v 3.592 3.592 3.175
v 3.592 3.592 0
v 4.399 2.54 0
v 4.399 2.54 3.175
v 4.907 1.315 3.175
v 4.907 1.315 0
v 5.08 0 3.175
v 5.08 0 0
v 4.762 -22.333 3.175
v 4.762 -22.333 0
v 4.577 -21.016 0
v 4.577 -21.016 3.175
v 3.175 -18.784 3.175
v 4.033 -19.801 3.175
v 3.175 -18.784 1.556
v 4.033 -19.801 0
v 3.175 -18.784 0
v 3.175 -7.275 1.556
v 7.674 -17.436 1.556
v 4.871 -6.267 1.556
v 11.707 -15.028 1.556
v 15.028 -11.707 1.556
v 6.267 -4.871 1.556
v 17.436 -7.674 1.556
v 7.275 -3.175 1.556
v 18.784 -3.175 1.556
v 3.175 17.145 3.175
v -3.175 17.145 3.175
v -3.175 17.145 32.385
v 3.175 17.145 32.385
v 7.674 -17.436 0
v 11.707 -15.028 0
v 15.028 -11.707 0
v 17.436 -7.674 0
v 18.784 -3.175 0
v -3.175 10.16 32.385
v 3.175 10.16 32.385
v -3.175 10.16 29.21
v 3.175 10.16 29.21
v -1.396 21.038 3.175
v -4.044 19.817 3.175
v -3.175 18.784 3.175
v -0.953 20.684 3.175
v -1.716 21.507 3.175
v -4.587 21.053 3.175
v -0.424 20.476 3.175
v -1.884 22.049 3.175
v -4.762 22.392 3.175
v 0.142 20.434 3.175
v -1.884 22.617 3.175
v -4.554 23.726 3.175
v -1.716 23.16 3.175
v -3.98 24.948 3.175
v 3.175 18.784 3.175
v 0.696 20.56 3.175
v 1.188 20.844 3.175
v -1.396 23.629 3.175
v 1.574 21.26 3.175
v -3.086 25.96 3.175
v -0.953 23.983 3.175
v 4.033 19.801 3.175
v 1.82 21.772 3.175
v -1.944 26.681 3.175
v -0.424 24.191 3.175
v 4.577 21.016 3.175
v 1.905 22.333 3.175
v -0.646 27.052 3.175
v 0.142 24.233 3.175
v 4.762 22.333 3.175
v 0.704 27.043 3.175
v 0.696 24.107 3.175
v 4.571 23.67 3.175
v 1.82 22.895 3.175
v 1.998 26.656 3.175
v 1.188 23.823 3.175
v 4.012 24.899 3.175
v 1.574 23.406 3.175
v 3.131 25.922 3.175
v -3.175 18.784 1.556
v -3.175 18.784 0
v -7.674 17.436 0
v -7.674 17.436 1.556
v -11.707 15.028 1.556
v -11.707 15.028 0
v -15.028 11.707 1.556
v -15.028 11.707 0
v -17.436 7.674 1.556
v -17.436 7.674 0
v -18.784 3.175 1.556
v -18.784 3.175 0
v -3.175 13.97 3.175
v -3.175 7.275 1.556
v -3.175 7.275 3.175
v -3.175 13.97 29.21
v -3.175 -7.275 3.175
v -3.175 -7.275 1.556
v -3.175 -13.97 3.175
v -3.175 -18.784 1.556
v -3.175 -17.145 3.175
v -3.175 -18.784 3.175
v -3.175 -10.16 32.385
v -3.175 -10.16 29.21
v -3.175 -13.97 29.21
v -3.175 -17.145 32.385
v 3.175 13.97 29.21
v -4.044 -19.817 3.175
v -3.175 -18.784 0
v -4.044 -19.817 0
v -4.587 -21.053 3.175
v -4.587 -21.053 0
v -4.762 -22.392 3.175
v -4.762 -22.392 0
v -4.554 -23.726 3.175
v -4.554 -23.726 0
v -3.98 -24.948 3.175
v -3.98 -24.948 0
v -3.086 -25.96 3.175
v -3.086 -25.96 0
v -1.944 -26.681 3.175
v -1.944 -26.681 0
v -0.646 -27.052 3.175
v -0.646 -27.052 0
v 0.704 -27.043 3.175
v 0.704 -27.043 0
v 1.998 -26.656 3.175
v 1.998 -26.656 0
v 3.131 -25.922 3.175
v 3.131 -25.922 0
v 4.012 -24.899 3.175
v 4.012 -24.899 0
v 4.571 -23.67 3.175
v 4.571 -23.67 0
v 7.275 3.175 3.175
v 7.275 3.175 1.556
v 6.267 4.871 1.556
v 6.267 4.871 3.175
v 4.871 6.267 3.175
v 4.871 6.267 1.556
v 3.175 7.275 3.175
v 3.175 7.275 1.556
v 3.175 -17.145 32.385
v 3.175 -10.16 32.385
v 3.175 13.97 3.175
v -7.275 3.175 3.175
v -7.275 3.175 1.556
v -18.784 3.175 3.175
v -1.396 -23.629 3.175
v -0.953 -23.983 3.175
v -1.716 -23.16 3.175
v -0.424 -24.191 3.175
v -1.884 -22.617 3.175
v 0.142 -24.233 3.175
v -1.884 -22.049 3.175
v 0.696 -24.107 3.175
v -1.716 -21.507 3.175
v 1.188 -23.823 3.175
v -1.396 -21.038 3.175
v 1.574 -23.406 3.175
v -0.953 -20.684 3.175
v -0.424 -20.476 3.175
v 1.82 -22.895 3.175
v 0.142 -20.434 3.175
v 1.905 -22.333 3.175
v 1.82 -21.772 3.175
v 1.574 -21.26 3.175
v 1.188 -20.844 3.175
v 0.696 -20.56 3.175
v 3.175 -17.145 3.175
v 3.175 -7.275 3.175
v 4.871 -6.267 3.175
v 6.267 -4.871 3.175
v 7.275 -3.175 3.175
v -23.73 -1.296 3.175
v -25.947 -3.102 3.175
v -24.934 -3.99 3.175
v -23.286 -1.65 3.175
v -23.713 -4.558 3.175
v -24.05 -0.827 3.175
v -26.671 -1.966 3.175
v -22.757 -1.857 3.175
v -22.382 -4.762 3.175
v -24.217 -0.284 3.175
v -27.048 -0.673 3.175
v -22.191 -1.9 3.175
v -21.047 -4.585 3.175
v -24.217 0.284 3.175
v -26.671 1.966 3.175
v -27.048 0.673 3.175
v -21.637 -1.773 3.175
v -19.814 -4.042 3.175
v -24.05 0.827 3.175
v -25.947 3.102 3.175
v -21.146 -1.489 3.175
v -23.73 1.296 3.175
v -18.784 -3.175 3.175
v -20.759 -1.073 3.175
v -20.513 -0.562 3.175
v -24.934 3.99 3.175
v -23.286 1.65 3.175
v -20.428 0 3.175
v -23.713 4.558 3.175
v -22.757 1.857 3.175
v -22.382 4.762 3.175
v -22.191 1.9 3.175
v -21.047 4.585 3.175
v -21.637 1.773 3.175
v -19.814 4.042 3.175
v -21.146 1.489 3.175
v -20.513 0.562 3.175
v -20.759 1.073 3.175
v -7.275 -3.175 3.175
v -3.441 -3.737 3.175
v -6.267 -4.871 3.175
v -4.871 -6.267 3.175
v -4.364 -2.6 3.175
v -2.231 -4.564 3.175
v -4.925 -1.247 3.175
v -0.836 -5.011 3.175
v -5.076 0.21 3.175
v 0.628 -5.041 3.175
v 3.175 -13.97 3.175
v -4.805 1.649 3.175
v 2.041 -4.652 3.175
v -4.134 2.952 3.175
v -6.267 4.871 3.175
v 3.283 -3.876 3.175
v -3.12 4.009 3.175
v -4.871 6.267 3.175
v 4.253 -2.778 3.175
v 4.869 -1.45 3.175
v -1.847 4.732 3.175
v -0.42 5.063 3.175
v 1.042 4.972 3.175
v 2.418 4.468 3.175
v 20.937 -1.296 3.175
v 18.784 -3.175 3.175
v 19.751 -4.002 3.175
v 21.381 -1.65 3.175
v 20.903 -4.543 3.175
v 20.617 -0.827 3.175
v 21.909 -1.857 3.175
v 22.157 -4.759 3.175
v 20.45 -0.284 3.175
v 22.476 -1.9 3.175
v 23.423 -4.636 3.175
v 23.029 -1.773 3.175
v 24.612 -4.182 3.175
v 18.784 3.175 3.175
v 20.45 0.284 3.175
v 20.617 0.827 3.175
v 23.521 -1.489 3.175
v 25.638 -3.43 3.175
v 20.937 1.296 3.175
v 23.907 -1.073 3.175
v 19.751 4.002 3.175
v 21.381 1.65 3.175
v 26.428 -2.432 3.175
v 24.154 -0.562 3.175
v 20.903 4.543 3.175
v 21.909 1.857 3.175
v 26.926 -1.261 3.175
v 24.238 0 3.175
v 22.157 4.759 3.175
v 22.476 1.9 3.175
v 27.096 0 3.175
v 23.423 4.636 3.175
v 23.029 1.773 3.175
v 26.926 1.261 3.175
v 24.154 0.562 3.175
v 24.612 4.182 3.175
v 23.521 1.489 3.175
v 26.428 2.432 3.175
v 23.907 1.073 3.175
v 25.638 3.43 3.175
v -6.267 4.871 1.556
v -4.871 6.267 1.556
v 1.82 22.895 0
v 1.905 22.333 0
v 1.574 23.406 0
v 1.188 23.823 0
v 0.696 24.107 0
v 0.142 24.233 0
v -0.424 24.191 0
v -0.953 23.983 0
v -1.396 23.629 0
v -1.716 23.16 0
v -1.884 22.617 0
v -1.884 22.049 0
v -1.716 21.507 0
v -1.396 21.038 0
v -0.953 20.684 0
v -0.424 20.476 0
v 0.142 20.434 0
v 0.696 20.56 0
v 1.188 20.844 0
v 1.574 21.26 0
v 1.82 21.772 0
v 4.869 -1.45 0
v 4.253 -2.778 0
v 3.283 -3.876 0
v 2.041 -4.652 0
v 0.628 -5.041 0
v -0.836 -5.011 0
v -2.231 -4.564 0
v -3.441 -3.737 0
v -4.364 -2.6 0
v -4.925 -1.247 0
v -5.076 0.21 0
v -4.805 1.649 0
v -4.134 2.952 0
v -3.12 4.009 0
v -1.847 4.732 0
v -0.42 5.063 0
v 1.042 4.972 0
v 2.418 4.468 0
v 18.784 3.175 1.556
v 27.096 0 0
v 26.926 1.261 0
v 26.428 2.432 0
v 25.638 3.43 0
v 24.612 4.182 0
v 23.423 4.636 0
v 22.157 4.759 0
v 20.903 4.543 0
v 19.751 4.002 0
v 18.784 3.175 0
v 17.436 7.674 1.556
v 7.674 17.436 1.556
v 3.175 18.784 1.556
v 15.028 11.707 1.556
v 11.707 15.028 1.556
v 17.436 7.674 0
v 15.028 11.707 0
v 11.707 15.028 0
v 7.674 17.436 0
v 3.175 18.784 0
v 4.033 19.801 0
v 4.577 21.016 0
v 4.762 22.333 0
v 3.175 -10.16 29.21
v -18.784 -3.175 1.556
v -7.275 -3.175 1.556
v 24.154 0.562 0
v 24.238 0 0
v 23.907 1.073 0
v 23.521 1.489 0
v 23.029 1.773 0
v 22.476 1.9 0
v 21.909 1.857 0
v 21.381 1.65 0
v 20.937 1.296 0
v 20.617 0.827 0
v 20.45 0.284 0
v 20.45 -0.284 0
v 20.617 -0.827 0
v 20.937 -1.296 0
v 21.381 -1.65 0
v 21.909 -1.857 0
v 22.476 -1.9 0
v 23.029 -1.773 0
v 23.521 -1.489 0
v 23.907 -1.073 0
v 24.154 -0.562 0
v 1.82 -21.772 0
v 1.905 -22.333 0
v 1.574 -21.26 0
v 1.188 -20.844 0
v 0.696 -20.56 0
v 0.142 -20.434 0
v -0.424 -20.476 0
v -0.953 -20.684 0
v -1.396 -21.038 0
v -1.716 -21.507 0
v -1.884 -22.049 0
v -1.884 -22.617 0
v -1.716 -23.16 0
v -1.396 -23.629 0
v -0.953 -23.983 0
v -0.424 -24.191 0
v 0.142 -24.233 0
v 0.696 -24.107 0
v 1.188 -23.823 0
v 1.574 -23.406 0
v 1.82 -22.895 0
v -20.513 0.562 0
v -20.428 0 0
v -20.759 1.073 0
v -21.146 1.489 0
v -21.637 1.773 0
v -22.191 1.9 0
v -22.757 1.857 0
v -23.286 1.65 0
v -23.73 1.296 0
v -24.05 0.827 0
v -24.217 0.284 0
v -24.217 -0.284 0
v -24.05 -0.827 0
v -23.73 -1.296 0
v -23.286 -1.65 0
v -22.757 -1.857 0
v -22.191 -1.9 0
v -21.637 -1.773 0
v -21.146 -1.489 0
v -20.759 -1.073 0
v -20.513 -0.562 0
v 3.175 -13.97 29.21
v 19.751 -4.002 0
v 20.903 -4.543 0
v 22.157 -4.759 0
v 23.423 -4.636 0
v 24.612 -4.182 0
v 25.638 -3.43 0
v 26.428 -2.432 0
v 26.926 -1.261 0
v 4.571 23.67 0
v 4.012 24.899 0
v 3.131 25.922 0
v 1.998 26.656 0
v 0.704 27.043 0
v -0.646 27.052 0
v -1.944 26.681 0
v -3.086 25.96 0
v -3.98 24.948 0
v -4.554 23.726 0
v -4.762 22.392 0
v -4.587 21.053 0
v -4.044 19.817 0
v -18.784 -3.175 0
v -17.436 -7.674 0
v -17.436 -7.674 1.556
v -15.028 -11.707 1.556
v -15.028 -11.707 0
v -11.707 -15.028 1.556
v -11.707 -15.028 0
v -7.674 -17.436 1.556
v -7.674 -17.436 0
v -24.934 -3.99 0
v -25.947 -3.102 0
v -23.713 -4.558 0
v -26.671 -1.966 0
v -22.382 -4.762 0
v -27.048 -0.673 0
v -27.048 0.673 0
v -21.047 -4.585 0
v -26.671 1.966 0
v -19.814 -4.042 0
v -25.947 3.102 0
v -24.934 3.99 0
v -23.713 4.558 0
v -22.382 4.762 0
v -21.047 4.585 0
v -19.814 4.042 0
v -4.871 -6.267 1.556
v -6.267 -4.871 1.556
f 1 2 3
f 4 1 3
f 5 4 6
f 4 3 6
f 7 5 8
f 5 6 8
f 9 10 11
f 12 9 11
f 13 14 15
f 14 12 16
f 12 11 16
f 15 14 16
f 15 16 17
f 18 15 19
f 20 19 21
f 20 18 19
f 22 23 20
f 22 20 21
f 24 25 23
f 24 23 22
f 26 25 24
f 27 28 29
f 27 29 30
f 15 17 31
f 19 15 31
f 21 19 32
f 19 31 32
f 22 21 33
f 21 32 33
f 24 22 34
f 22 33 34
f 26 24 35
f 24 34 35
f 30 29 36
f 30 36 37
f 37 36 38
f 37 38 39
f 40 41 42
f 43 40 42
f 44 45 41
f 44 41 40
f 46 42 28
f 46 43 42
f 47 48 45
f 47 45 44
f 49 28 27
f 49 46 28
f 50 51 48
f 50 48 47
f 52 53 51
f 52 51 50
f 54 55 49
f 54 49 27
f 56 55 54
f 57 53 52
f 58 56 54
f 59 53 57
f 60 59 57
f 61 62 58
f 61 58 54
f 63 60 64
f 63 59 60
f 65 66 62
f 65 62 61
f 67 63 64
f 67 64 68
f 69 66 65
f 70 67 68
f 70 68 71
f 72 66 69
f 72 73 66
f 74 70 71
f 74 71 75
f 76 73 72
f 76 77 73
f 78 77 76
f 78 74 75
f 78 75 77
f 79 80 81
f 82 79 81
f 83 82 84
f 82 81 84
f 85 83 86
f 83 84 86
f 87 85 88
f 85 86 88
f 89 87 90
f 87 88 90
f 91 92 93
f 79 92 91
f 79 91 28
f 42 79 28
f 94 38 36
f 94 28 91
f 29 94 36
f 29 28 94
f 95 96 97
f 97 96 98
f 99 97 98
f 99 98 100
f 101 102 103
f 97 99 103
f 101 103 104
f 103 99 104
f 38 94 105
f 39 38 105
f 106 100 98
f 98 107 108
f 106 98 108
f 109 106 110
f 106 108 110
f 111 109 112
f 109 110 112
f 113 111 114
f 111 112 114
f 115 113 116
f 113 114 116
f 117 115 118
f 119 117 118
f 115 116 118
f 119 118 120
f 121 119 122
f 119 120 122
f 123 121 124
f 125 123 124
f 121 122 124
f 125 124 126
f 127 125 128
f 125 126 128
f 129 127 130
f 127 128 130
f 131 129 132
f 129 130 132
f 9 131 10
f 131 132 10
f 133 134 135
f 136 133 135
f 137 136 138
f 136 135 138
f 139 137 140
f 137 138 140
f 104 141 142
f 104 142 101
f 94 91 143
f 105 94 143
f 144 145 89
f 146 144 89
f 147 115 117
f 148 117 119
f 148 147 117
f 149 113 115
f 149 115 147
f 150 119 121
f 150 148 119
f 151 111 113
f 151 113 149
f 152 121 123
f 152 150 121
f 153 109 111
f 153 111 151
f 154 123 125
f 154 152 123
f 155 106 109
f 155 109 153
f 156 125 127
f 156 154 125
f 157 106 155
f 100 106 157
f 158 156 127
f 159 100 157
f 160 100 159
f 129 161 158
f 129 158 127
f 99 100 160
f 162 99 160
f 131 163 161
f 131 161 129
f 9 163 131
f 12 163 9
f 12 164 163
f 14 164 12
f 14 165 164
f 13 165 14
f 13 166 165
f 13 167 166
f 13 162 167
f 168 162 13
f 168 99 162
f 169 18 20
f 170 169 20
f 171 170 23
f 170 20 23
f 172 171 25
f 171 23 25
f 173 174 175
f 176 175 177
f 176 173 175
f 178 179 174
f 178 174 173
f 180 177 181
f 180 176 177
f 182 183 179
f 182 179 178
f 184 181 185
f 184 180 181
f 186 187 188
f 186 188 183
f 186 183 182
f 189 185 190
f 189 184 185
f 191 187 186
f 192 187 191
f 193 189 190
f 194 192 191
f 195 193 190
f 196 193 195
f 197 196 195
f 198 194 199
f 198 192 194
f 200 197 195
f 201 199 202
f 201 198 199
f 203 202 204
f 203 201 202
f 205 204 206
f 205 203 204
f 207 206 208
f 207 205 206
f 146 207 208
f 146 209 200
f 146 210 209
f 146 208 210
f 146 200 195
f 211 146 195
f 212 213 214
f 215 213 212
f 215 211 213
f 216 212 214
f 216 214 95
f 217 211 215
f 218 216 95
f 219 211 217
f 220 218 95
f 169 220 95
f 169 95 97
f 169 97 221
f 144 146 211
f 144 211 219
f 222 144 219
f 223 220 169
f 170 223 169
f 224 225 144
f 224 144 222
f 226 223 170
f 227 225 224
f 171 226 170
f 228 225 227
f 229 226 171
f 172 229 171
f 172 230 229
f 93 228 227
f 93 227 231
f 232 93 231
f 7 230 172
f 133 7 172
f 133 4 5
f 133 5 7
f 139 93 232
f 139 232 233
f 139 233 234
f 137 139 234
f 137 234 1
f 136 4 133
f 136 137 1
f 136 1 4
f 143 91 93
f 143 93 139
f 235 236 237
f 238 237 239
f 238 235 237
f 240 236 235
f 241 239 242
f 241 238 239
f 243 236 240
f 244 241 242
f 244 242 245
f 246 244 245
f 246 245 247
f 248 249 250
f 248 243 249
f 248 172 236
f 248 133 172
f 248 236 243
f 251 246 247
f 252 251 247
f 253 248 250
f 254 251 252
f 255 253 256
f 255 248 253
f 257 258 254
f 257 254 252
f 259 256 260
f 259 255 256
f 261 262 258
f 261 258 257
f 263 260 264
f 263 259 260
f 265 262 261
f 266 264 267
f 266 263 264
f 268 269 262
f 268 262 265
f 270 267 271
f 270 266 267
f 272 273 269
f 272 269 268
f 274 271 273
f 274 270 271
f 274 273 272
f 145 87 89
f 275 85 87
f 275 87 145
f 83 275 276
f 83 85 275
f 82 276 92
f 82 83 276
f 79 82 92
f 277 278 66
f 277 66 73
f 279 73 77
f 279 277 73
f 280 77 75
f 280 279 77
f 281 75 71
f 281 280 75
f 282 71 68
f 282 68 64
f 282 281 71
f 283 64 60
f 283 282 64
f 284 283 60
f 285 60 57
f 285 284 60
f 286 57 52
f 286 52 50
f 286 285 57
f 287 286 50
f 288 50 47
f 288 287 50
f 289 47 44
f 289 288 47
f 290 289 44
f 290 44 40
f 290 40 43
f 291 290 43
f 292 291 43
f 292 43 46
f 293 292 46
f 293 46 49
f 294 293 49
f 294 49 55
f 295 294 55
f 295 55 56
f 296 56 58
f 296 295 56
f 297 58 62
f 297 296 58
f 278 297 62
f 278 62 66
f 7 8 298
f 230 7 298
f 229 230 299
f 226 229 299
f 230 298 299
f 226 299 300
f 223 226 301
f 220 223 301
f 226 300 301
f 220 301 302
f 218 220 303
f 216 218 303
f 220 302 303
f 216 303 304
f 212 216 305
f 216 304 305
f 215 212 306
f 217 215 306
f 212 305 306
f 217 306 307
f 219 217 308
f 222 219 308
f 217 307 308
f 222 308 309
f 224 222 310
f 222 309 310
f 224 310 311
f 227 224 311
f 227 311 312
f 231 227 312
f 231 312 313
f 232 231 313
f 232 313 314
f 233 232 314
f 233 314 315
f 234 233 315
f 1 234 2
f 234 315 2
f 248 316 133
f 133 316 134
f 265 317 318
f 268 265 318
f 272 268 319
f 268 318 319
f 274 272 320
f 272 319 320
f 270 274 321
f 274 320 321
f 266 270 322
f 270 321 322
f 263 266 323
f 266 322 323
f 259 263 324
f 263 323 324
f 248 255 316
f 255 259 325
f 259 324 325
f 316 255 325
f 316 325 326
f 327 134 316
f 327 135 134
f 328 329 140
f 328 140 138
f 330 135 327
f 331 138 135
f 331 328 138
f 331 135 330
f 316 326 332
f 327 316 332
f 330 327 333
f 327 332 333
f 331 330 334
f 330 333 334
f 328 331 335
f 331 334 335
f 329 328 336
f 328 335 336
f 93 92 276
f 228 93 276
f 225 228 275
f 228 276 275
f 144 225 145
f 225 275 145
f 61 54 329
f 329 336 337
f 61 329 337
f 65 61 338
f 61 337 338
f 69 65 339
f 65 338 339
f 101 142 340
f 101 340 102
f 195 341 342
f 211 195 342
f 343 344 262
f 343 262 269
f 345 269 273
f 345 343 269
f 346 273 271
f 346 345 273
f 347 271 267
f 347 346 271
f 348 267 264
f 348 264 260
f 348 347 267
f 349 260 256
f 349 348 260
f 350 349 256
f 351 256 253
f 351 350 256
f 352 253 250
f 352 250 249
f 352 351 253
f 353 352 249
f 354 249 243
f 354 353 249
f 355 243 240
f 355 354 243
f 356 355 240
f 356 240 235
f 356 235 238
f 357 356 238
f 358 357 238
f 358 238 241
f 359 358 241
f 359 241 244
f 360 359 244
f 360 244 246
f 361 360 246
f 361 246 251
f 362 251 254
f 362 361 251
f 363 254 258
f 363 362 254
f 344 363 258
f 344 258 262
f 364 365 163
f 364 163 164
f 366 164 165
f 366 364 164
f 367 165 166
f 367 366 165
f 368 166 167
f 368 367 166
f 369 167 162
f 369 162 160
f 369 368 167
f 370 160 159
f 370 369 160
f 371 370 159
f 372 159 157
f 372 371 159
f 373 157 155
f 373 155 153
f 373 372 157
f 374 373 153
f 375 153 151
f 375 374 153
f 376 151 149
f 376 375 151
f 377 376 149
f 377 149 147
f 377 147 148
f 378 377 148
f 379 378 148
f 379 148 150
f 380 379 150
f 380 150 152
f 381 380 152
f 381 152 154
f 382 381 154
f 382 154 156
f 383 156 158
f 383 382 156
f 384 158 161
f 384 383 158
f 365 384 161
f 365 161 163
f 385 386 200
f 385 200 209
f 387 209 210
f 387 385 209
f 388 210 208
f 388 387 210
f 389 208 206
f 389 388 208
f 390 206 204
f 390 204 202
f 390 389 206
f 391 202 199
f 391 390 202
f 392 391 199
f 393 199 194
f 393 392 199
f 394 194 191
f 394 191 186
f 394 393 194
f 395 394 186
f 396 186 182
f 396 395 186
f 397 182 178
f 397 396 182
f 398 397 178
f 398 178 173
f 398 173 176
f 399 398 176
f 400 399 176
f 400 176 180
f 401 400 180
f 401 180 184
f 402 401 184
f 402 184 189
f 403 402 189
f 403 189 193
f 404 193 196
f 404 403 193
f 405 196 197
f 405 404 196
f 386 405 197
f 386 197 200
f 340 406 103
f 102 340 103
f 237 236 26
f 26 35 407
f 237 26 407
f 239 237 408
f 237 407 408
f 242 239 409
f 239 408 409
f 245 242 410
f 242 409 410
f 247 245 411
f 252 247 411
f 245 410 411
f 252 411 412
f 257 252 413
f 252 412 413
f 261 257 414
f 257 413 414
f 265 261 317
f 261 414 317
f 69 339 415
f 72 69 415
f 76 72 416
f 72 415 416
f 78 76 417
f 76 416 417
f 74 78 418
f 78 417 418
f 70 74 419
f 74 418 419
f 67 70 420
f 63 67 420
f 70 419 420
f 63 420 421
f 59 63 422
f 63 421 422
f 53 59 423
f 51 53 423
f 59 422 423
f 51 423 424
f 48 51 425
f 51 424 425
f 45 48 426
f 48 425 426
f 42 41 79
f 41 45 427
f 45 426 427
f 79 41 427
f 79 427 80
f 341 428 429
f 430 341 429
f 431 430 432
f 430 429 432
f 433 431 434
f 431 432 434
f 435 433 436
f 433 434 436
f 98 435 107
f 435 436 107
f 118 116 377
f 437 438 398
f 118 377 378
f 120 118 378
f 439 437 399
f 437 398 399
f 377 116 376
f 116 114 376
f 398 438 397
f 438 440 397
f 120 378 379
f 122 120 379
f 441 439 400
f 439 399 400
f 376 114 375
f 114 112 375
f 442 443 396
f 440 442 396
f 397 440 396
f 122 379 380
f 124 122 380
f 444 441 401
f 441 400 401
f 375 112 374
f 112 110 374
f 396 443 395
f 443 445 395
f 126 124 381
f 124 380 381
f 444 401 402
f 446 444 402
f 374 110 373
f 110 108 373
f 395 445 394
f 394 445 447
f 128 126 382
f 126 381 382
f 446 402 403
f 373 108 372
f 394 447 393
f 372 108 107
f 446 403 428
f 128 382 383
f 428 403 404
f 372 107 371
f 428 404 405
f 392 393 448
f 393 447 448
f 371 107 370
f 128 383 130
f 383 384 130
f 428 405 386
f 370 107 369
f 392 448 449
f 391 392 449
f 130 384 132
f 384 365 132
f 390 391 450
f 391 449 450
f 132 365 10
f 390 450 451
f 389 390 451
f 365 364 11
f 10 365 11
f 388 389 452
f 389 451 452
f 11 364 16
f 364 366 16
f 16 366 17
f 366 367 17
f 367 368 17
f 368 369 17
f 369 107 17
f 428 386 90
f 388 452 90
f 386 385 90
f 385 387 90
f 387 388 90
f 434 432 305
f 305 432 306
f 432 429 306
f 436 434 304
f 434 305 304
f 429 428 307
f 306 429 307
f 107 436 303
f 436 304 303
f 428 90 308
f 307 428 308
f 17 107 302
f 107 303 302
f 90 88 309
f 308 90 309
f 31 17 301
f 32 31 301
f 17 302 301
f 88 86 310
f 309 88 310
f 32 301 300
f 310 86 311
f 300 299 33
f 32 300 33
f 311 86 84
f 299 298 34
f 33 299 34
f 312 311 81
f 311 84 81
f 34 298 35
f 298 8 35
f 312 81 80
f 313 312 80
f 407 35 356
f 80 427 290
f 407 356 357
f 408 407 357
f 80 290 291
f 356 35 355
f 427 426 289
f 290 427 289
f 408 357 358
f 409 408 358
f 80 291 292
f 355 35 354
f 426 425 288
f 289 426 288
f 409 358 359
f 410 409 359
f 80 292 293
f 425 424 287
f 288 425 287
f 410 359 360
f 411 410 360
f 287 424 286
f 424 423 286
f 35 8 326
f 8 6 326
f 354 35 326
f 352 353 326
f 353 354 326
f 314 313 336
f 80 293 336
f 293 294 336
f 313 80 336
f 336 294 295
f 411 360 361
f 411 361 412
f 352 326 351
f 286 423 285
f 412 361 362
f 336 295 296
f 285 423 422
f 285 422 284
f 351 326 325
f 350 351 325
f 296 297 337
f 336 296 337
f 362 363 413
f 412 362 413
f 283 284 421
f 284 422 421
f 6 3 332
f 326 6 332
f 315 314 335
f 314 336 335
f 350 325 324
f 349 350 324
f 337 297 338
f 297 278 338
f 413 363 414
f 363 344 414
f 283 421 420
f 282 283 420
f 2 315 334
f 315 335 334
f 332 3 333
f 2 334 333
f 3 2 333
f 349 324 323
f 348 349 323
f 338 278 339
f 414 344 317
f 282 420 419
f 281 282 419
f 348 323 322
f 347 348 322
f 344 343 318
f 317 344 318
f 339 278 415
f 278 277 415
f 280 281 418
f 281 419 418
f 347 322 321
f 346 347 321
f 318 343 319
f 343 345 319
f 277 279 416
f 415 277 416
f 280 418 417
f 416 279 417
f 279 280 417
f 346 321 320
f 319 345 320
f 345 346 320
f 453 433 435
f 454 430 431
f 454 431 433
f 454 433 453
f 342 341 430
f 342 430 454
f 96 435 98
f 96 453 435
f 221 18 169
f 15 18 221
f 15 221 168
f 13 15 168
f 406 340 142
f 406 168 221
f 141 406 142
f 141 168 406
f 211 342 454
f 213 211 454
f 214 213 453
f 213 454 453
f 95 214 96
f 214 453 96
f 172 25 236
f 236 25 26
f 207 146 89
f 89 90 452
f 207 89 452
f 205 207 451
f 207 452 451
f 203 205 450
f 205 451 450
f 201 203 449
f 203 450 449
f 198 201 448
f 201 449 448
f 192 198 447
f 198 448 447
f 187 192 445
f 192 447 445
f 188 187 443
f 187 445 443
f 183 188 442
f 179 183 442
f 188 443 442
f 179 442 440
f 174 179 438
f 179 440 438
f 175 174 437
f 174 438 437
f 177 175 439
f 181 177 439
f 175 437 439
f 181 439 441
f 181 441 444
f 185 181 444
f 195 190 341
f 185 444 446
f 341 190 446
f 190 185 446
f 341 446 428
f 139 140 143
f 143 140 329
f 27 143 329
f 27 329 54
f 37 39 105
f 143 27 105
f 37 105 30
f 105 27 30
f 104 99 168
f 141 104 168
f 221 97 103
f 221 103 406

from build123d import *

# Parameters (mm, degrees)
F0_R     = 1.905
F1_DEPTH = 3.175
F2_DEPTH = 1.55575
F0_W     = 6.35
F0_H     = 3.175
F3_DEPTH = 32.385
F5_W     = 6.35
F5_H     = 3.175
F6_DEPTH = 3.81
F4_W     = 6.35
F4_H     = 3.175
F7_DEPTH = 3.81


with BuildPart() as f1:
    # F0 (on Top) → F1 (new body)
    with BuildSketch(Plane.XY):
        with BuildLine():
            ThreePointArc((18.7835533113, -3.175), (17.5708112256, 0), (18.7835533113, 3.175))
            Line((18.7835533113, 3.175), (7.2748389157, 3.175))
            ThreePointArc((7.2748389157, 3.175), (7.7700688589, 1.6217077968), (7.9375, 0))
            ThreePointArc((7.9375, 0), (7.7700688589, -1.6217077968), (7.2748389157, -3.175))
            Line((7.2748389157, -3.175), (18.7835533113, -3.175))
        make_face()
        with BuildLine():
            ThreePointArc((18.7835533113, -3.175), (18.9832714591, -1.5930802583), (19.05, 0))
            ThreePointArc((19.05, 0), (18.9832714591, 1.5930802583), (18.7835533113, 3.175))
            ThreePointArc((18.7835533113, 3.175), (17.5708112256, 0), (18.7835533113, -3.175))
        make_face()
        with BuildLine():
            ThreePointArc((18.7835533113, 3.175), (18.9832714591, 1.5930802583), (19.05, 0))
            ThreePointArc((19.05, 0), (18.9832714591, -1.5930802583), (18.7835533113, -3.175))
            ThreePointArc((18.7835533113, -3.175), (24.0326764282, -4.4489958596), (27.0958112256, 0))
            ThreePointArc((27.0958112256, 0), (24.0326764282, 4.4489958596), (18.7835533113, 3.175))
        make_face()
        with Locations((22.3333112256, 0)):
            Circle(F0_R, mode=Mode.SUBTRACT)
        with BuildLine():
            ThreePointArc((-3.175, 7.2748389157), (0, 7.9375), (3.175, 7.2748389157))
            Line((3.175, 7.2748389157), (3.175, 13.97))
            Line((3.175, 13.97), (-3.175, 13.97))
            Line((-3.175, 13.97), (-3.175, 7.2748389157))
        make_face()
        with BuildLine():
            ThreePointArc((7.9375, 0), (7.7700688589, 1.6217077968), (7.2748389157, 3.175))
            ThreePointArc((7.2748389157, 3.175), (5.6126600757, 5.6126600757), (3.175, 7.2748389157))
            ThreePointArc((3.175, 7.2748389157), (0, 7.9375), (-3.175, 7.2748389157))
            ThreePointArc((-3.175, 7.2748389157), (-5.6126600757, 5.6126600757), (-7.2748389157, 3.175))
            ThreePointArc((-7.2748389157, 3.175), (-7.9375, 0), (-7.2748389157, -3.175))
            ThreePointArc((-7.2748389157, -3.175), (-5.6126600757, -5.6126600757), (-3.175, -7.2748389157))
            ThreePointArc((-3.175, -7.2748389157), (0, -7.9375), (3.175, -7.2748389157))
            ThreePointArc((3.175, -7.2748389157), (5.6126600757, -5.6126600757), (7.2748389157, -3.175))
            ThreePointArc((7.2748389157, -3.175), (7.7700688589, -1.6217077968), (7.9375, 0))
        make_face()
        with BuildLine():
            ThreePointArc((3.5921024484, 3.5921024484), (4.6933080252, 1.9440318364), (5.08, 0))
            ThreePointArc((5.08, 0), (-4.6933080252, -1.9440318364), (3.5921024484, 3.5921024484))
        make_face(mode=Mode.SUBTRACT)
        with BuildLine():
            Line((-7.2748389157, 3.175), (-18.7835533113, 3.175))
            ThreePointArc((-18.7835533113, 3.175), (-17.8843153661, 1.6993652025), (-17.5708112256, 0))
            ThreePointArc((-17.5708112256, 0), (-17.8843153661, -1.6993652025), (-18.7835533113, -3.175))
            Line((-18.7835533113, -3.175), (-7.2748389157, -3.175))
            ThreePointArc((-7.2748389157, -3.175), (-7.9375, 0), (-7.2748389157, 3.175))
        make_face()
        with BuildLine():
            Line((3.175, -13.97), (3.175, -7.2748389157))
            ThreePointArc((3.175, -7.2748389157), (0, -7.9375), (-3.175, -7.2748389157))
            Line((-3.175, -7.2748389157), (-3.175, -13.97))
            Line((-3.175, -13.97), (3.175, -13.97))
        make_face()
        with BuildLine():
            ThreePointArc((-17.5708112256, 0), (-17.8843153661, 1.6993652025), (-18.7835533113, 3.175))
            ThreePointArc((-18.7835533113, 3.175), (-19.05, 0), (-18.7835533113, -3.175))
            ThreePointArc((-18.7835533113, -3.175), (-17.8843153661, -1.6993652025), (-17.5708112256, 0))
        make_face()
        with BuildLine():
            ThreePointArc((-18.7835533113, -3.175), (-19.05, 0), (-18.7835533113, 3.175))
            ThreePointArc((-18.7835533113, 3.175), (-27.0958112256, 0), (-18.7835533113, -3.175))
        make_face()
        with Locations((-22.3333112256, 0)):
            Circle(F0_R, mode=Mode.SUBTRACT)
    extrude(amount=F1_DEPTH)



with BuildPart() as f1b:
    # F0 (on Top) → F1, piece 2 (new body)
    with BuildSketch(Plane.XY):
        with BuildLine():
            Line((3.175, 17.145), (3.175, 18.7835533113))
            ThreePointArc((3.175, 18.7835533113), (0, 17.5708112256), (-3.175, 18.7835533113))
            Line((-3.175, 18.7835533113), (-3.175, 17.145))
            Line((-3.175, 17.145), (3.175, 17.145))
        make_face()
        with BuildLine():
            ThreePointArc((-3.175, 18.7835533113), (0, 19.05), (3.175, 18.7835533113))
            ThreePointArc((3.175, 18.7835533113), (4.3475478002, 20.3890287423), (4.7625, 22.3333112256))
            ThreePointArc((4.7625, 22.3333112256), (-1.9442824833, 26.6808590258), (-3.175, 18.7835533113))
        make_face()
        with Locations((0, 22.3333112256)):
            Circle(F0_R, mode=Mode.SUBTRACT)
        with BuildLine():
            ThreePointArc((-3.175, 18.7835533113), (0, 17.5708112256), (3.175, 18.7835533113))
            ThreePointArc((3.175, 18.7835533113), (0, 19.05), (-3.175, 18.7835533113))
        make_face()
    extrude(amount=F1_DEPTH)


with BuildPart() as f1c:
    # F0 (on Top) → F1, piece 3 (new body)
    with BuildSketch(Plane.XY):
        with BuildLine():
            ThreePointArc((-3.175, -18.7835533113), (0, -17.5708112256), (3.175, -18.7835533113))
            Line((3.175, -18.7835533113), (3.175, -17.145))
            Line((3.175, -17.145), (-3.175, -17.145))
            Line((-3.175, -17.145), (-3.175, -18.7835533113))
        make_face()
        with BuildLine():
            ThreePointArc((-3.175, -18.7835533113), (0, -19.05), (3.175, -18.7835533113))
            ThreePointArc((3.175, -18.7835533113), (0, -17.5708112256), (-3.175, -18.7835533113))
        make_face()
        with BuildLine():
            ThreePointArc((4.7625, -22.3333112256), (4.3475478002, -20.3890287423), (3.175, -18.7835533113))
            ThreePointArc((3.175, -18.7835533113), (0, -19.05), (-3.175, -18.7835533113))
            ThreePointArc((-3.175, -18.7835533113), (-1.9442824833, -26.6808590258), (4.7625, -22.3333112256))
        make_face()
        with Locations((0, -22.3333112256)):
            Circle(F0_R, mode=Mode.SUBTRACT)
    extrude(amount=F1_DEPTH)


with BuildPart() as f1_1:
    add(f1.part)

    add(f1b.part)  # F2 merges F1b

    add(f1c.part)  # F2 merges F1c
    # F0 (on Top) → F2 (join)
    with BuildSketch(Plane.XY):
        with BuildLine():
            Line((7.2748389157, 3.175), (18.7835533113, 3.175))
            ThreePointArc((18.7835533113, 3.175), (13.4703841816, 13.4703841816), (3.175, 18.7835533113))
            Line((3.175, 18.7835533113), (3.175, 17.145))
            Line((3.175, 17.145), (3.175, 13.97))
            Line((3.175, 13.97), (3.175, 7.2748389157))
            ThreePointArc((3.175, 7.2748389157), (5.6126600757, 5.6126600757), (7.2748389157, 3.175))
        make_face()
        with BuildLine():
            ThreePointArc((3.175, -18.7835533113), (13.4703841816, -13.4703841816), (18.7835533113, -3.175))
            Line((18.7835533113, -3.175), (7.2748389157, -3.175))
            ThreePointArc((7.2748389157, -3.175), (5.6126600757, -5.6126600757), (3.175, -7.2748389157))
            Line((3.175, -7.2748389157), (3.175, -13.97))
            Line((3.175, -13.97), (3.175, -17.145))
            Line((3.175, -17.145), (3.175, -18.7835533113))
        make_face()
        with BuildLine():
            Line((-3.175, 17.145), (-3.175, 18.7835533113))
            ThreePointArc((-3.175, 18.7835533113), (-13.4703841816, 13.4703841816), (-18.7835533113, 3.175))
            Line((-18.7835533113, 3.175), (-7.2748389157, 3.175))
            ThreePointArc((-7.2748389157, 3.175), (-5.6126600757, 5.6126600757), (-3.175, 7.2748389157))
            Line((-3.175, 7.2748389157), (-3.175, 13.97))
            Line((-3.175, 13.97), (-3.175, 17.145))
        make_face()
        with BuildLine():
            ThreePointArc((-18.7835533113, -3.175), (-13.4703841816, -13.4703841816), (-3.175, -18.7835533113))
            Line((-3.175, -18.7835533113), (-3.175, -17.145))
            Line((-3.175, -17.145), (-3.175, -13.97))
            Line((-3.175, -13.97), (-3.175, -7.2748389157))
            ThreePointArc((-3.175, -7.2748389157), (-5.6126600757, -5.6126600757), (-7.2748389157, -3.175))
            Line((-7.2748389157, -3.175), (-18.7835533113, -3.175))
        make_face()
    extrude(amount=F2_DEPTH)

    # F0 (on Top) → F3 (join)
    with BuildSketch(Plane.XY):
        with Locations((0, -15.5575)):
            Rectangle(F0_W, F0_H)
        with Locations((0, 15.5575)):
            Rectangle(F0_W, F0_H)
    extrude(amount=F3_DEPTH)

    # F5 (on face) → F6 (join)
    with BuildSketch(Plane(origin=(0, -13.97, 0), x_dir=(-1, 0, 0), z_dir=(0, 1, 0))):
        with Locations((0, 30.7975)):
            Rectangle(F5_W, F5_H)
    extrude(amount=F6_DEPTH)

    # F4 (on face) → F7 (join)
    with BuildSketch(Plane.XZ.offset(-13.97)):
        with Locations((0, 30.7975)):
            Rectangle(F4_W, F4_H)
    extrude(amount=F7_DEPTH)


solid = f1_1.part
